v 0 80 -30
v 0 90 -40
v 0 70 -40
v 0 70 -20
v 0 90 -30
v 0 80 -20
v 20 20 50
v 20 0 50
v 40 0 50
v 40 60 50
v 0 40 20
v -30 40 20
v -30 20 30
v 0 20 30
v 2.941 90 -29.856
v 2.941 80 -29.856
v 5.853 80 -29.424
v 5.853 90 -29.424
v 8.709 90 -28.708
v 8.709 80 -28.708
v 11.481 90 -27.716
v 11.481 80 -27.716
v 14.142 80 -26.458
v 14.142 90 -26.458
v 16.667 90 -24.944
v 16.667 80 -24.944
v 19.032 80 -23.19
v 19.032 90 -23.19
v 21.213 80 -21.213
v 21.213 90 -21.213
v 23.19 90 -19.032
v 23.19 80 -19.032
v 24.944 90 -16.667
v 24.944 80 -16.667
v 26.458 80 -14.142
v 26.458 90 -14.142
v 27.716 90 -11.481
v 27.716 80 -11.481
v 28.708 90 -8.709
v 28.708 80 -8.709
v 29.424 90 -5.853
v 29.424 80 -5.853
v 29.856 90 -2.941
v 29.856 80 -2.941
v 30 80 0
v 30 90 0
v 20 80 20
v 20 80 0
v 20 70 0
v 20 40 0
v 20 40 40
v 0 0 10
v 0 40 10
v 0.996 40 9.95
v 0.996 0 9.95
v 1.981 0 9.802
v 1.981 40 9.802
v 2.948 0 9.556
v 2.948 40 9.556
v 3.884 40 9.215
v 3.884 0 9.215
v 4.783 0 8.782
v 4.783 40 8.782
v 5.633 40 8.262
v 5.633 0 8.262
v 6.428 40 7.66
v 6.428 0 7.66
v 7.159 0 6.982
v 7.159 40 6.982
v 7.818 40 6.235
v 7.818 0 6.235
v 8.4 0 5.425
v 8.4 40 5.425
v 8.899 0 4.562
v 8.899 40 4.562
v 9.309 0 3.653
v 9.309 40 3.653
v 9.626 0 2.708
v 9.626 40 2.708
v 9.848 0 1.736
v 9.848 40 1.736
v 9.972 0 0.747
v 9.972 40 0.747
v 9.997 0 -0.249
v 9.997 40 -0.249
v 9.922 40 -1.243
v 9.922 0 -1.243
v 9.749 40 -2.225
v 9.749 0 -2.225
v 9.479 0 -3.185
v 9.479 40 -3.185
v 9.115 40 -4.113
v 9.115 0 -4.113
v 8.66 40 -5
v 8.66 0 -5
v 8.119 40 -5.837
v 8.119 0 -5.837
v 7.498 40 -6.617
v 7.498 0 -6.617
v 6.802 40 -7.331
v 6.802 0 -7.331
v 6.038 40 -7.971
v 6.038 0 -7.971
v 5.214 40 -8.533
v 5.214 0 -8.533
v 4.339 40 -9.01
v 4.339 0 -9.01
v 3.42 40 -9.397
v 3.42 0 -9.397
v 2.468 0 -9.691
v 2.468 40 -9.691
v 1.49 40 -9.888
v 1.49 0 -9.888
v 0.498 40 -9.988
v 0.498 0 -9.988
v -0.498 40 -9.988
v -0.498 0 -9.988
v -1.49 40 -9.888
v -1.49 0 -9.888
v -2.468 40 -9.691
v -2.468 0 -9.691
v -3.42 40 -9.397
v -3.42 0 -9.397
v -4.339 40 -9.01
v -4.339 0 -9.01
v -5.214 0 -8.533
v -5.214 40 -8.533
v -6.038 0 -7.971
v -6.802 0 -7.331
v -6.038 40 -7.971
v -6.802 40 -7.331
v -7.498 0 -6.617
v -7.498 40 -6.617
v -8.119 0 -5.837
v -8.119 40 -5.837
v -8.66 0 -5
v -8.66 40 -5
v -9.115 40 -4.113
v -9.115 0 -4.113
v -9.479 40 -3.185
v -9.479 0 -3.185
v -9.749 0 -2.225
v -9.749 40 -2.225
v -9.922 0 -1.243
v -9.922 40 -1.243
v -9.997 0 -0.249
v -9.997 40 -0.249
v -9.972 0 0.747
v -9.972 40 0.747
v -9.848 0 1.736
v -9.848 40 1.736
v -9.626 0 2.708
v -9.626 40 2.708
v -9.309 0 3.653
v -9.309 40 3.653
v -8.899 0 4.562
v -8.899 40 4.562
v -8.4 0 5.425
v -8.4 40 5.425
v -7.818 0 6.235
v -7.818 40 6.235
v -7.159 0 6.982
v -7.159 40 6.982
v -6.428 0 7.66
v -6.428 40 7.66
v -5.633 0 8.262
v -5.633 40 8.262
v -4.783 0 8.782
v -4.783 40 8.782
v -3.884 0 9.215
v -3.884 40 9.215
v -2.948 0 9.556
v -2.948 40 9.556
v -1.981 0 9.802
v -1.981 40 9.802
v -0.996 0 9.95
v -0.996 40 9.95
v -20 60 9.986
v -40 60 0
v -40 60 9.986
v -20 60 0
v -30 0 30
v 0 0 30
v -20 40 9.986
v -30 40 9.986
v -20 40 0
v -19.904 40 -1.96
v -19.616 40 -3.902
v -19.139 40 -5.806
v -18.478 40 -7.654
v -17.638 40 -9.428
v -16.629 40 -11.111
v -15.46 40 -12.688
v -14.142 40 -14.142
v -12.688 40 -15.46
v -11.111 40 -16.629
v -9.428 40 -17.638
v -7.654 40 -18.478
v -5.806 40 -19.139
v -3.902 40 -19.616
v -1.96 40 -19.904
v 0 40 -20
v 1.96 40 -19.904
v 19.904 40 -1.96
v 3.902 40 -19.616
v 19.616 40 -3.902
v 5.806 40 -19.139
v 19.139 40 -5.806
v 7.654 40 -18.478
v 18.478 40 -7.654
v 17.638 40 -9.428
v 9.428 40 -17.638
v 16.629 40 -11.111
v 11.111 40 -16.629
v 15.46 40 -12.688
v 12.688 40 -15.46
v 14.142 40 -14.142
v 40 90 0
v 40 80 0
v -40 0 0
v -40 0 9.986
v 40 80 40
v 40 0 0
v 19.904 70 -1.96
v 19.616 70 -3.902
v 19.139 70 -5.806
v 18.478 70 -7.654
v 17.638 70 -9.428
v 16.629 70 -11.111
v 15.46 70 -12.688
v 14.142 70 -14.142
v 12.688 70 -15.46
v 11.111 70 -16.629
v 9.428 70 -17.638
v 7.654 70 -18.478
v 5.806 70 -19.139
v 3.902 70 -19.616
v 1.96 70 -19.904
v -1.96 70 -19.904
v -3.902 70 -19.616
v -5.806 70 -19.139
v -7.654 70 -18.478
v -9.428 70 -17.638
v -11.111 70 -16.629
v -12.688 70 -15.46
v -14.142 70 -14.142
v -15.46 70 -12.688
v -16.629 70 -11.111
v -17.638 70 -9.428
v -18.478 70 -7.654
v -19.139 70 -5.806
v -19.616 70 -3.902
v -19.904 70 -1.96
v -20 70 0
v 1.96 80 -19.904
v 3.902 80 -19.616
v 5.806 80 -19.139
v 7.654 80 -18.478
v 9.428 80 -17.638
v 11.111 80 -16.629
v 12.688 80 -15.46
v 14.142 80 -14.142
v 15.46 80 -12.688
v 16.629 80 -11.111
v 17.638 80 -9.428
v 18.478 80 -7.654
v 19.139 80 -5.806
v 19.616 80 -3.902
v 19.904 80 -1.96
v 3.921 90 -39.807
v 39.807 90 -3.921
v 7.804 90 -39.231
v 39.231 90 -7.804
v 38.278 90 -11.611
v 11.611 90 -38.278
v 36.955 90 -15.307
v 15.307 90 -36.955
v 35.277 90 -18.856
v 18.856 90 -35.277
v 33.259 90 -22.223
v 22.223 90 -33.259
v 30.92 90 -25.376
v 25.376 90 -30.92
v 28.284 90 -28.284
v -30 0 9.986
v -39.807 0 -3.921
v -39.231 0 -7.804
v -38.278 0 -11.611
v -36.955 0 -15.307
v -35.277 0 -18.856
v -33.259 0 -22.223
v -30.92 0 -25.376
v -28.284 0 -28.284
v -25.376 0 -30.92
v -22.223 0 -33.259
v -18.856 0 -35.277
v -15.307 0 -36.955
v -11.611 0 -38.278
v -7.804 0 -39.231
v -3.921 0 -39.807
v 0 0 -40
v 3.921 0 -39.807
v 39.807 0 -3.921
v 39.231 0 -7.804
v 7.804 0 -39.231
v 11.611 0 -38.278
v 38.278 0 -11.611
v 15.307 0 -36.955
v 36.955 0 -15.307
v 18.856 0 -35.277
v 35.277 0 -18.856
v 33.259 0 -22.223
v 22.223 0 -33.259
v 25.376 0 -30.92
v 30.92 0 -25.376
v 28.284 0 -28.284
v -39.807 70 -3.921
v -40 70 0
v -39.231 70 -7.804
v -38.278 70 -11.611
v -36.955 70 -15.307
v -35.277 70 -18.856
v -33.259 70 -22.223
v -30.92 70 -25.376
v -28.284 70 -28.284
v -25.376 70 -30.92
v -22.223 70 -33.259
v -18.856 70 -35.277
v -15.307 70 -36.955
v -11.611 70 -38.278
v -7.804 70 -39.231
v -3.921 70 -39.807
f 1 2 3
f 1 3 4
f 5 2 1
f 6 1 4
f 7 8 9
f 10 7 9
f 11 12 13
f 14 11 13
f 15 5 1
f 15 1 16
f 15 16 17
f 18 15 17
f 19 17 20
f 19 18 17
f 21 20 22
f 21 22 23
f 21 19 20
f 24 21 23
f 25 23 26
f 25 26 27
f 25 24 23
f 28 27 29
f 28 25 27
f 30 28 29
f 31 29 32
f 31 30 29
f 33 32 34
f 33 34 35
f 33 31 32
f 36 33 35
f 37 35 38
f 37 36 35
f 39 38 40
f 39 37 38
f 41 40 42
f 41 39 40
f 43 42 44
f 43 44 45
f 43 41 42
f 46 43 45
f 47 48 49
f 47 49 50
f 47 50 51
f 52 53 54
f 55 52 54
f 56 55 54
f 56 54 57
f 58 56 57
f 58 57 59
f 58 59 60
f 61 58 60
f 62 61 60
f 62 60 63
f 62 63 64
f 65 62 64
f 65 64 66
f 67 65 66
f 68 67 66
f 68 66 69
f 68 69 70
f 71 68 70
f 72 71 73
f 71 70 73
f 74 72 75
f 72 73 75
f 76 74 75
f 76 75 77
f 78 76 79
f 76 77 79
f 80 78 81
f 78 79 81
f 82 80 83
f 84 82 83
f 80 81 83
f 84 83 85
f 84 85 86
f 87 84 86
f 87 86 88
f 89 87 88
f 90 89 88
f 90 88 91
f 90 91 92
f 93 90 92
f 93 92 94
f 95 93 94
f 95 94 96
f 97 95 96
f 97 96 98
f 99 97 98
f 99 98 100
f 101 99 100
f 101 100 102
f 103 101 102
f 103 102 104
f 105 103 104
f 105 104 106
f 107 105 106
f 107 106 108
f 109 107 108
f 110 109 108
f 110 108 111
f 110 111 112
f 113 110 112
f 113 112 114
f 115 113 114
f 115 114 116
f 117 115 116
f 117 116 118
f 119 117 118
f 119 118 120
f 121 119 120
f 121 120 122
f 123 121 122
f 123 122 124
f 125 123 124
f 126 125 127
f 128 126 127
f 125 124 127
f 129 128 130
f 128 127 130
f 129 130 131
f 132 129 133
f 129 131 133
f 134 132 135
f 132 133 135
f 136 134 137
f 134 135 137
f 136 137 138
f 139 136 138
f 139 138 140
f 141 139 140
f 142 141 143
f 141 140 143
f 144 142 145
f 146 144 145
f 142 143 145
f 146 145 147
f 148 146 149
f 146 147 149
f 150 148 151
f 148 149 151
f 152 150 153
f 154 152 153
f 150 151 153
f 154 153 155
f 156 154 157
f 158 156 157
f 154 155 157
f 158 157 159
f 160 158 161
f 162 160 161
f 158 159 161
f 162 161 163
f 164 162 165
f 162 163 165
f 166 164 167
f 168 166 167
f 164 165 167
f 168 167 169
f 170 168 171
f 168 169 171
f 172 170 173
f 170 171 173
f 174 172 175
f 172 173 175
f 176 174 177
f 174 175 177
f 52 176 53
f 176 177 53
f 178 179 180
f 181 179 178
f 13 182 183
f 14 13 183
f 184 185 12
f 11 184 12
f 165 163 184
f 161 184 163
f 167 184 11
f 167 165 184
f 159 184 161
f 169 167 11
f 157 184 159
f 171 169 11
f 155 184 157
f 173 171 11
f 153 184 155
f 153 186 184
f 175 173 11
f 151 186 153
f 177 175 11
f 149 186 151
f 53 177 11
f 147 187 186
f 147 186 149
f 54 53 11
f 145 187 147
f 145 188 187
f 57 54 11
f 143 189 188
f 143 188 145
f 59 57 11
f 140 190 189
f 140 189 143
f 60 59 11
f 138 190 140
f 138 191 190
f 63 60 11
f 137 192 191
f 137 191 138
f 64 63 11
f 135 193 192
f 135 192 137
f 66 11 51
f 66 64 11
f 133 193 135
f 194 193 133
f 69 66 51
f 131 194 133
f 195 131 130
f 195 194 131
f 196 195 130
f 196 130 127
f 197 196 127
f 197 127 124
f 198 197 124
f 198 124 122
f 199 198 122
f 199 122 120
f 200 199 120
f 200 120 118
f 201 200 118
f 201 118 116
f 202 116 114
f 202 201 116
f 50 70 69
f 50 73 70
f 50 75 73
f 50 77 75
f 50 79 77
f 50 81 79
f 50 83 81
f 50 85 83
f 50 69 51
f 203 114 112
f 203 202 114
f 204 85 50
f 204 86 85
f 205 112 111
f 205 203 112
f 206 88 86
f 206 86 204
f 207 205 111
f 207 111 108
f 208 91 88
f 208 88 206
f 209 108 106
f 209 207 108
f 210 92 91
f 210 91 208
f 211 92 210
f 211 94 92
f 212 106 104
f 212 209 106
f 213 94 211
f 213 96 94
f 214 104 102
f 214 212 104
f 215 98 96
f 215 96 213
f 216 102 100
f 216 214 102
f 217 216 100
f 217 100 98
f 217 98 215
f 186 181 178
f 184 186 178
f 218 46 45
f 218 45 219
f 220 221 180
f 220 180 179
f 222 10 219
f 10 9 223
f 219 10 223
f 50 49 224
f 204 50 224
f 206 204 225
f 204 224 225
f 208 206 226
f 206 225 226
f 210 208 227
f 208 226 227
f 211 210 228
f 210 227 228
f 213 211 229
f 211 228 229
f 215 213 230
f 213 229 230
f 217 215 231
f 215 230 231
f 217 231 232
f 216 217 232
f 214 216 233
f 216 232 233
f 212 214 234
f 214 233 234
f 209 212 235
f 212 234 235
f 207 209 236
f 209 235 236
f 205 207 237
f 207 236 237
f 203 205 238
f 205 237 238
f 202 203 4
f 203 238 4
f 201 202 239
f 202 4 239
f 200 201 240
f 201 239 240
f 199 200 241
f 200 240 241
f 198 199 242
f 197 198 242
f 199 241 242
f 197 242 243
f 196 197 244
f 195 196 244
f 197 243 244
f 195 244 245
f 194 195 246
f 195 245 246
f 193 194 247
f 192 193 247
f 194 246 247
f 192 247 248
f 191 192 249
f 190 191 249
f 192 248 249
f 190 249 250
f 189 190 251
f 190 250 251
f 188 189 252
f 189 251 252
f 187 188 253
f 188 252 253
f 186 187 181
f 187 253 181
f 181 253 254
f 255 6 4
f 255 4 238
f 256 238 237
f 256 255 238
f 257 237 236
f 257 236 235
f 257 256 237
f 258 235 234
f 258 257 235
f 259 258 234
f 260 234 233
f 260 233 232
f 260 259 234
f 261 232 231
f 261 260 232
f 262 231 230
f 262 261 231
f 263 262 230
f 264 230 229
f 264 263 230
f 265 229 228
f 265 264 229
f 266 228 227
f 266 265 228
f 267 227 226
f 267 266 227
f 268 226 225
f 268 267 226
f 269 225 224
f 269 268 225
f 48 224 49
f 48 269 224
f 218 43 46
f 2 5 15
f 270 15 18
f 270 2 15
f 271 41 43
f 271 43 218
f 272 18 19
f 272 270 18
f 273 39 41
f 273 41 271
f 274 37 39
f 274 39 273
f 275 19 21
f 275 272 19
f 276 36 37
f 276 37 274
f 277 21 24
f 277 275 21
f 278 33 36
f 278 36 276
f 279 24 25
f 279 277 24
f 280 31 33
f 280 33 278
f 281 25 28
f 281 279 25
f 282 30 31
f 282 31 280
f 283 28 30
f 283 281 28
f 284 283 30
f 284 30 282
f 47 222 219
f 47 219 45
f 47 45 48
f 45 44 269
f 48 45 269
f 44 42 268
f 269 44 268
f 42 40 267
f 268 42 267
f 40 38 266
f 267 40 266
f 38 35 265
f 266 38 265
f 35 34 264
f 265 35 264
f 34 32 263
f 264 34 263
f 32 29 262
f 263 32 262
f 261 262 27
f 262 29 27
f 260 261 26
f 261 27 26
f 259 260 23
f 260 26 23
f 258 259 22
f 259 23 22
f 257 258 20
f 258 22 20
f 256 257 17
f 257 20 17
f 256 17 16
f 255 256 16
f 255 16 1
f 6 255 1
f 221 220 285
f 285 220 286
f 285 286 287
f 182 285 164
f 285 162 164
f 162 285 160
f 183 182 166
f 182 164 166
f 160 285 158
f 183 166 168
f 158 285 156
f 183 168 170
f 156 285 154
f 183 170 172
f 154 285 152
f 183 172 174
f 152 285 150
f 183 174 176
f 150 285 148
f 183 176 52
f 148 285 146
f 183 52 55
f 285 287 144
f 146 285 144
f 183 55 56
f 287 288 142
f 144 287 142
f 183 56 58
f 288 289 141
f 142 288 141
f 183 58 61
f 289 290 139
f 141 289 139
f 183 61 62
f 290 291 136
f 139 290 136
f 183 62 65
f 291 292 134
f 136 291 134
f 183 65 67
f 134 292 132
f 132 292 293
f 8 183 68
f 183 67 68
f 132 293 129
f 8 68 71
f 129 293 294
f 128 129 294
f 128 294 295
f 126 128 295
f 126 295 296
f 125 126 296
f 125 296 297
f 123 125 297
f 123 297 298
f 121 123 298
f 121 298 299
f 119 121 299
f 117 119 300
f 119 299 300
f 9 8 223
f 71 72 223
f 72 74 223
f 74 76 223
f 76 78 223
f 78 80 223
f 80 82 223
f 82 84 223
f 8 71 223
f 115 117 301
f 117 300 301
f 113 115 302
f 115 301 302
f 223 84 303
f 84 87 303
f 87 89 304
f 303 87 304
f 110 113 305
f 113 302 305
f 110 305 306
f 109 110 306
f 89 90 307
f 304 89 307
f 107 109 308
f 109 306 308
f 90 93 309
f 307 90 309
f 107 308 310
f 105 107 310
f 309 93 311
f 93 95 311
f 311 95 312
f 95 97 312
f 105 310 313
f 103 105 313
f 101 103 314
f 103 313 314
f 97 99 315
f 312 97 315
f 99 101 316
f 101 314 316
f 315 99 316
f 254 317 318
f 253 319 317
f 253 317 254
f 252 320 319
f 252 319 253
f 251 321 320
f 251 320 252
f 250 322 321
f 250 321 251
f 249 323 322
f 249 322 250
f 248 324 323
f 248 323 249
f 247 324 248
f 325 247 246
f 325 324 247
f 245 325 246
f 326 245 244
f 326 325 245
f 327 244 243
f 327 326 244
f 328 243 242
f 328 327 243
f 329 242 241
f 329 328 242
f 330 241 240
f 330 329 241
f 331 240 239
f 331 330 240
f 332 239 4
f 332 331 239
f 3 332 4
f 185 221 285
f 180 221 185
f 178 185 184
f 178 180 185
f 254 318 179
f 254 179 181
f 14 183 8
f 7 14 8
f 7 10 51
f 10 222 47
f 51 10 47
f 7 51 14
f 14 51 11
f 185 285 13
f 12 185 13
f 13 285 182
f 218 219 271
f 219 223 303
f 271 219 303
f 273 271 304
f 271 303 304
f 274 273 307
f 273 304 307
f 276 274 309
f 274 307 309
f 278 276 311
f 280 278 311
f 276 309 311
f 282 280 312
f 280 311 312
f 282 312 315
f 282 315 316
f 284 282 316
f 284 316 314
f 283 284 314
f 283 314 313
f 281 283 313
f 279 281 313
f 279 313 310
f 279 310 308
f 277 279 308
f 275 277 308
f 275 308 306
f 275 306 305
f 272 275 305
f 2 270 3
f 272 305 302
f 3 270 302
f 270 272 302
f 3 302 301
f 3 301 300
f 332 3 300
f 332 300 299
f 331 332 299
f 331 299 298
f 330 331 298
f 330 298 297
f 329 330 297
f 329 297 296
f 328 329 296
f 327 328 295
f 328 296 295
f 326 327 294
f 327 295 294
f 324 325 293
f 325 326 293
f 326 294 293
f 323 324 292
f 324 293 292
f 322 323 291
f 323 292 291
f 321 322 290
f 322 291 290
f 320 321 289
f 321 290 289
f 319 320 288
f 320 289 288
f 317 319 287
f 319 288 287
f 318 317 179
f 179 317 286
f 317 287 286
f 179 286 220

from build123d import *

# Parameters (mm, degrees)
BOSS_EXTRUDE1_DEPTH = 90
SKETCH2_R           = 10
CUT_EXTRUDE1_DEPTH  = 90
CUT_EXTRUDE2_DEPTH  = 10
CUT_EXTRUDE3_DEPTH  = 20
SKETCH11_W          = 10
SKETCH11_H          = 9.986072288
BOSS_EXTRUDE2_DEPTH = 70
SKETCH12_W          = 20
SKETCH12_H          = 9.986072288
CUT_EXTRUDE11_DEPTH = 10
CUT_EXTRUDE25_DEPTH = 30
CUT_EXTRUDE26_DEPTH = 30
CUT_EXTRUDE27_DEPTH = 83


with BuildPart() as part:
    # Sketch1 → Boss-Extrude1 (new body)
    with BuildSketch(Plane(origin=(0, 0, 0), x_dir=(1, 0, 0), z_dir=(0, 1, 0))):
        with BuildLine():
            Line((-40, 0), (-30, 0))
            Line((-30, 0), (-30, -30))
            Line((-30, -30), (0, -30))
            Line((0, -30), (20, -50))
            Line((20, -50), (40, -50))
            Line((40, -50), (40, 0))
            ThreePointArc((40, 0), (0, 40), (-40, 0))
        make_face()
    extrude(amount=BOSS_EXTRUDE1_DEPTH)

    # Sketch2 → Cut-Extrude1 (cut)
    with BuildSketch(Plane(origin=(0, 90, 0), x_dir=(1, 0, 0), z_dir=(0, 1, 0))):
        with Locations(Location((0, 0, 0), (0, 0, 270))):
            Circle(SKETCH2_R)
    extrude(amount=-CUT_EXTRUDE1_DEPTH, mode=Mode.SUBTRACT)

    # Sketch3 → Cut-Extrude2 (cut)
    with BuildSketch(Plane(origin=(0, 90, 0), x_dir=(1, 0, 0), z_dir=(0, 1, 0))):
        with BuildLine():
            Line((30, 0), (40, 0))
            Line((40, 0), (40, -40))
            Line((40, -40), (20, -20))
            Line((20, -20), (20, 0))
            ThreePointArc((20, 0), (14.142135624, 14.142135624), (0, 20))
            Line((0, 20), (0, 30))
            ThreePointArc((0, 30), (21.213203436, 21.213203436), (30, 0))
        make_face()
    extrude(amount=-CUT_EXTRUDE2_DEPTH, mode=Mode.SUBTRACT)

    # Sketch4 → Cut-Extrude3 (cut)
    with BuildSketch(Plane(origin=(0, 90, 0), x_dir=(1, 0, 0), z_dir=(0, 1, 0))):
        with BuildLine():
            Line((0, 40), (0, 20))
            ThreePointArc((0, 20), (14.142135624, 14.142135624), (20, 0))
            Line((20, 0), (20, -20))
            Line((20, -20), (20, -59.206848118))
            Line((20, -59.206848118), (-30, -59.206848118))
            Line((-30, -59.206848118), (-30, 0))
            Line((-30, 0), (-40, 0))
            ThreePointArc((-40, 0), (-28.284271247, 28.284271247), (0, 40))
        make_face()
    extrude(amount=-CUT_EXTRUDE3_DEPTH, mode=Mode.SUBTRACT)

    # Sketch11 → Boss-Extrude2 (add)
    with BuildSketch(Plane(origin=(0, 70, 0), x_dir=(1, 0, 0), z_dir=(0, 1, 0))):
        with Locations((-35, -4.993036144)):
            Rectangle(SKETCH11_W, SKETCH11_H)
    extrude(amount=-BOSS_EXTRUDE2_DEPTH)

    # Sketch12 → Cut-Extrude11 (cut)
    with BuildSketch(Plane(origin=(0, 70, 0), x_dir=(1, 0, 0), z_dir=(0, 1, 0))):
        with Locations((-30, -4.993036144)):
            Rectangle(SKETCH12_W, SKETCH12_H)
    extrude(amount=-CUT_EXTRUDE11_DEPTH, mode=Mode.SUBTRACT)

    # Sketch21 → Cut-Extrude25 (cut)
    with BuildSketch(Plane(origin=(0, 70, 0), x_dir=(1, 0, 0), z_dir=(0, 1, 0))):
        with BuildLine():
            Line((-20, 0), (-20, -9.986072288))
            Line((-20, -9.986072288), (-30, -9.986072288))
            Line((-30, -9.986072288), (-30, -30))
            Line((-30, -30), (-20, -30))
            Line((-20, -30), (-20, -44.965046587))
            Line((-20, -44.965046587), (20, -44.965046587))
            Line((20, -44.965046587), (20, 0))
            ThreePointArc((20, 0), (0, 20), (-20, 0))
        make_face()
    extrude(amount=-CUT_EXTRUDE25_DEPTH, mode=Mode.SUBTRACT)

    # Sketch22 → Cut-Extrude26 (cut)
    with BuildSketch(Plane.ZY.offset(30)):
        Polygon((20, 40), (30, 20), (30, 40), align=None)
    extrude(amount=-CUT_EXTRUDE26_DEPTH, mode=Mode.SUBTRACT)

    # 3DSketch3 → Cut-Extrude27 (cut, along a direction that is not the sketch's normal)
    with BuildSketch(Plane(origin=(0, 20, 30), x_dir=(0.549442255794756, 0.8241633836921342, 0.1373605639486891), z_dir=(-0.6666666666666666, 0.3333333333333332, 0.6666666666666669))):
        Polygon((0, 0), (15.109662034, 16.483267674), (28.845718429, -8.241633837), (59.065042498, 24.724901511), (72.801098893, 0), (57.691436858, -16.483267674), (13.736056395, -24.724901511), align=None)
    extrude(amount=CUT_EXTRUDE27_DEPTH, dir=(0, 1, 0), mode=Mode.SUBTRACT)


solid = part.part
